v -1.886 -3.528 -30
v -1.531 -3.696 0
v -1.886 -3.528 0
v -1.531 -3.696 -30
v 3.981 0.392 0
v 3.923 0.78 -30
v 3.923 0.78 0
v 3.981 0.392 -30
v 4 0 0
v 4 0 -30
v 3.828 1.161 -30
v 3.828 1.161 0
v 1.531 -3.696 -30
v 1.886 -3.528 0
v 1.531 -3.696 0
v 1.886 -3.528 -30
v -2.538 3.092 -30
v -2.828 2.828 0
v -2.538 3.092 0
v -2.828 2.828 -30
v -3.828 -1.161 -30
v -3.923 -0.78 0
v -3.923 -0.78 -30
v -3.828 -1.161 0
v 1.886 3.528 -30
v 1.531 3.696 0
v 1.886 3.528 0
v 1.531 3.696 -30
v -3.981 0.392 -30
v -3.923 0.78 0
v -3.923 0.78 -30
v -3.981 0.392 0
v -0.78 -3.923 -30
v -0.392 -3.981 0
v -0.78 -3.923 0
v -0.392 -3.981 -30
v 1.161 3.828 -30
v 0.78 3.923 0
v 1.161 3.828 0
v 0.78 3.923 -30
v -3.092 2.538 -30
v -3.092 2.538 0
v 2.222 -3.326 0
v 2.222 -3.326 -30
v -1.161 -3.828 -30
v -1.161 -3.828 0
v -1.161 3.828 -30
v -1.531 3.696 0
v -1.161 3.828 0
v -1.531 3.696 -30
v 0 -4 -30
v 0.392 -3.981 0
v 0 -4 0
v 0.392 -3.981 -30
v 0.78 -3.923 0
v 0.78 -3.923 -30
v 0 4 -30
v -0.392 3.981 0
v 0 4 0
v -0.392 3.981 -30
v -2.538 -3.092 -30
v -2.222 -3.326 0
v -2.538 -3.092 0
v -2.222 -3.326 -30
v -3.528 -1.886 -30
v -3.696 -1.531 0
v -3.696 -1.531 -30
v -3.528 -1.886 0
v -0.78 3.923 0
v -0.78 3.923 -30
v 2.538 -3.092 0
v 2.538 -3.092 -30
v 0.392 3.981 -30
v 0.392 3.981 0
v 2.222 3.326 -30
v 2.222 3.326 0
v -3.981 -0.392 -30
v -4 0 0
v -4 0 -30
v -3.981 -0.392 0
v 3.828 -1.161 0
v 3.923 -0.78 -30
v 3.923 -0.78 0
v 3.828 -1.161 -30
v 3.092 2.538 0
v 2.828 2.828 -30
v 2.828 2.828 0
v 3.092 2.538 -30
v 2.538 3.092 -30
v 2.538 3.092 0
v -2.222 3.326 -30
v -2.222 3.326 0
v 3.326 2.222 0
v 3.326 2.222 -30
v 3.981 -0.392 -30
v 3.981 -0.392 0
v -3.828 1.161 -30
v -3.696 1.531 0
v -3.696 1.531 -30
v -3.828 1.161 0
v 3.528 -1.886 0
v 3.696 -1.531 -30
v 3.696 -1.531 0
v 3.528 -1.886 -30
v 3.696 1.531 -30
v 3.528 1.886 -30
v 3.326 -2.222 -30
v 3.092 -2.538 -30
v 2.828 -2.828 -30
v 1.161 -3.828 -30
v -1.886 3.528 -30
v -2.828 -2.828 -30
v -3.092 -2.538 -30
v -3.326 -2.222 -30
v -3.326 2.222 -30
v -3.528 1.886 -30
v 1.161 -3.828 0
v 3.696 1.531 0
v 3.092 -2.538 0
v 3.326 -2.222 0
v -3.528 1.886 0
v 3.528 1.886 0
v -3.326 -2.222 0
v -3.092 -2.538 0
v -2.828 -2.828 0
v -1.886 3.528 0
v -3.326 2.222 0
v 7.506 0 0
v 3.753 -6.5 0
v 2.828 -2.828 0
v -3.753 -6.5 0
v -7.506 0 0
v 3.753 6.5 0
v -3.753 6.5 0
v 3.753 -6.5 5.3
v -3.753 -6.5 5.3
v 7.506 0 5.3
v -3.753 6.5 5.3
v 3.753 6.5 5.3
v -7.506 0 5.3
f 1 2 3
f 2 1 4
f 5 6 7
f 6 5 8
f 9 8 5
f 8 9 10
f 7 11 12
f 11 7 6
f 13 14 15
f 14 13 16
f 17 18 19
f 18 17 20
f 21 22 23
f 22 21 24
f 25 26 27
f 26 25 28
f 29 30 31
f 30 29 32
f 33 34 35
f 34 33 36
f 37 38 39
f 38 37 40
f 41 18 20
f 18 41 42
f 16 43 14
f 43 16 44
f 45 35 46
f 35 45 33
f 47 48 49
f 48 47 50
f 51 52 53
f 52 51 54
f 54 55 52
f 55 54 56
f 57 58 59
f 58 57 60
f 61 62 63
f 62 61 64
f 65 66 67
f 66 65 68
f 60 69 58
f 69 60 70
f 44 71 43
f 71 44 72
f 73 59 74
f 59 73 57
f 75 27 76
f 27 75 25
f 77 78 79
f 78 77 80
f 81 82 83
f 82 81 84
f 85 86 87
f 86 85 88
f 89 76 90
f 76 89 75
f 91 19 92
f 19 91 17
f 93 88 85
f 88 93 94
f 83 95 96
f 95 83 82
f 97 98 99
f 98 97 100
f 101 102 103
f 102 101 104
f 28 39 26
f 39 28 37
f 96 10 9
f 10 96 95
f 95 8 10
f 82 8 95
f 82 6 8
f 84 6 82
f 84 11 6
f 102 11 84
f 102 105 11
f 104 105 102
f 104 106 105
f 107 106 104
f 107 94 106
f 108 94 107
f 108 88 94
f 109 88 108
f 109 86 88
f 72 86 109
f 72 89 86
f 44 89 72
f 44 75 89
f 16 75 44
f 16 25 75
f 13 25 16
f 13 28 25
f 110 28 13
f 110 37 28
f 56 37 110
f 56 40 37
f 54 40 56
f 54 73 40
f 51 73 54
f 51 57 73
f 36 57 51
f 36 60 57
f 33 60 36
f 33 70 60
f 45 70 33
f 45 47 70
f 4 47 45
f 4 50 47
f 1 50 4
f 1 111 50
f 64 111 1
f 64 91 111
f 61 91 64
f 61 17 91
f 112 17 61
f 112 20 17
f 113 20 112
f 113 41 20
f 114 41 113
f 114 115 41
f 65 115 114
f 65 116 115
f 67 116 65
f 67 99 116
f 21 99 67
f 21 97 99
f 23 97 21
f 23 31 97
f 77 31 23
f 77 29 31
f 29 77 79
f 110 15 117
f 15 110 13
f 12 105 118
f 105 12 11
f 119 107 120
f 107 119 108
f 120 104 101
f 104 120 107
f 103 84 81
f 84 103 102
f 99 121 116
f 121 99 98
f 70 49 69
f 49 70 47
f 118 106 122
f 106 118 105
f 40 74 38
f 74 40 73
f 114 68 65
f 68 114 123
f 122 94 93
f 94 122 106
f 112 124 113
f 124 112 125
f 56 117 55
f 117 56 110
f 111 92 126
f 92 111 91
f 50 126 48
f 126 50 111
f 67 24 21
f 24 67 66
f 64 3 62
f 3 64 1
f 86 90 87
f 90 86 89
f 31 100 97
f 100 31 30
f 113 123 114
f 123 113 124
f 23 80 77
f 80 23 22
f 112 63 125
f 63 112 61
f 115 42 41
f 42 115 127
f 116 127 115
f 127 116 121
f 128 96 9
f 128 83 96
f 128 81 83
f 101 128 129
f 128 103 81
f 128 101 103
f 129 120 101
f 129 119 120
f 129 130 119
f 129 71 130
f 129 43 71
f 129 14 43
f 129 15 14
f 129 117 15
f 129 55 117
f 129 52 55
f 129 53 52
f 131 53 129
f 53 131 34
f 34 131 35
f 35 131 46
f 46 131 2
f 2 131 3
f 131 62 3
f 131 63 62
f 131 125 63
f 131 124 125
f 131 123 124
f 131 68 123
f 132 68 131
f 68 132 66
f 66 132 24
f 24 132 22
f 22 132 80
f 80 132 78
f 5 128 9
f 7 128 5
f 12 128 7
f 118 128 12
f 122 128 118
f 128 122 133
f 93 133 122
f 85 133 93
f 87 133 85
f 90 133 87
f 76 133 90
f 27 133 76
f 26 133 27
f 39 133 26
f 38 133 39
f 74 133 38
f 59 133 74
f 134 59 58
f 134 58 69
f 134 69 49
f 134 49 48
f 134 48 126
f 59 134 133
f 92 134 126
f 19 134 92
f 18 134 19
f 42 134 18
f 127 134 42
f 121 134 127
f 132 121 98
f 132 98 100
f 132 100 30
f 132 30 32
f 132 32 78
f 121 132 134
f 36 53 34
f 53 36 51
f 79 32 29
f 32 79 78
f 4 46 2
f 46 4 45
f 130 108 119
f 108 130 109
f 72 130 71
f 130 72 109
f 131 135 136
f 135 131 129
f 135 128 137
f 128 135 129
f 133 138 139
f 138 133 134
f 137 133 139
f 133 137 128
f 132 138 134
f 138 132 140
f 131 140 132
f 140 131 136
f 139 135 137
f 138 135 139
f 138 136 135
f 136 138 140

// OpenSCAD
af = 13;
head_height = 5.3;
shaft_diameter = 8;
shaft_length = 30;
hex_radius = af / sqrt(3);

union() {
    translate([0, 0, -shaft_length])
        cylinder(
            d = shaft_diameter,
            h = shaft_length,
            $fn = 64
        );

    cylinder(
        r = hex_radius,
        h = head_height,
        $fn = 6
    );
}
